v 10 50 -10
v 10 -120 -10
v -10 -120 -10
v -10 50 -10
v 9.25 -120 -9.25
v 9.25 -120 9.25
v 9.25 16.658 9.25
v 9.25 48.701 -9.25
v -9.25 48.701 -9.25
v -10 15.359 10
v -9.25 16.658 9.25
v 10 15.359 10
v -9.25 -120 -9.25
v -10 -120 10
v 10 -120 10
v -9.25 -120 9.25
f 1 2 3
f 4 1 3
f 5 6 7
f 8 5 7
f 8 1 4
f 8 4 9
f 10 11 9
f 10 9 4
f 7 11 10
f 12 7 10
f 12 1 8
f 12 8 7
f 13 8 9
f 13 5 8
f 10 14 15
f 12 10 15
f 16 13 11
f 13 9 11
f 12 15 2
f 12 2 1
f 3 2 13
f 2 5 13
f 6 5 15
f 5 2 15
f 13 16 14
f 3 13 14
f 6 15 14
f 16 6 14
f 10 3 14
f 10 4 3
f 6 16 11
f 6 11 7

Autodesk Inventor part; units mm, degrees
ref_plane "YZ Plane" through (0, 0, 0) normal (1, 0, 0) x (0, 1, 0)
ref_plane "XZ Plane" through (0, 0, 0) normal (0, 1, 0) x (-1, 0, 0)
ref_plane "XY Plane" through (0, 0, 0) normal (0, 0, 1) x (1, 0, 0)
sketch "Эскиз1" plane through (0, 0, 0) normal (0, 1, 0) x (-1, 0, 0)
  line L0 (-10, -10) -> (10, -10)
  line L1 (10, -10) -> (10, 10)
  line L2 (10, 10) -> (-10, 10)
  line L3 (-10, 10) -> (-10, -10)
  line L4 (-10, -10) -> (10, 10) construction
  line L5 (10, -10) -> (-10, 10) construction
  line L6 (-9.25, -9.25) -> (9.25, -9.25)
  line L7 (9.25, -9.25) -> (9.25, 9.25)
  line L8 (9.25, 9.25) -> (-9.25, 9.25)
  line L9 (-9.25, 9.25) -> (-9.25, -9.25)
  line L10 (-9.25, -9.25) -> (9.25, 9.25) construction
  line L11 (9.25, -9.25) -> (-9.25, 9.25) construction
  point P0 (0, 0)
  dimension "d0" = 20
  dimension "d1" = 20
  dimension "d2" = 18.5
  dimension "d3" = 18.5
extrude "Выдавливание1" add sketch "Эскиз1" along normal blind 50 and the other way blind 120
sketch "Эскиз2" plane through (10, -120, 10) normal (1, 0, 0) x (0, 0, -1)
  line L0 (20, 0) -> (20, 170) projected
  line L1 (20, 170) -> (0, 135.359)
  line L2 (0, 0) -> (0, 170) projected
  line L3 (20, 170) -> (60, 170) construction
  line L4 (20, 170) -> (0, 170) projected
  line L5 (0, 135.359) -> (0, 170)
  line L6 (0, 170) -> (20, 170)
  point P0 (10, 120)
  dimension "d6" = 120
extrude "Выдавливание2" cut sketch "Эскиз2" against normal blind 50
